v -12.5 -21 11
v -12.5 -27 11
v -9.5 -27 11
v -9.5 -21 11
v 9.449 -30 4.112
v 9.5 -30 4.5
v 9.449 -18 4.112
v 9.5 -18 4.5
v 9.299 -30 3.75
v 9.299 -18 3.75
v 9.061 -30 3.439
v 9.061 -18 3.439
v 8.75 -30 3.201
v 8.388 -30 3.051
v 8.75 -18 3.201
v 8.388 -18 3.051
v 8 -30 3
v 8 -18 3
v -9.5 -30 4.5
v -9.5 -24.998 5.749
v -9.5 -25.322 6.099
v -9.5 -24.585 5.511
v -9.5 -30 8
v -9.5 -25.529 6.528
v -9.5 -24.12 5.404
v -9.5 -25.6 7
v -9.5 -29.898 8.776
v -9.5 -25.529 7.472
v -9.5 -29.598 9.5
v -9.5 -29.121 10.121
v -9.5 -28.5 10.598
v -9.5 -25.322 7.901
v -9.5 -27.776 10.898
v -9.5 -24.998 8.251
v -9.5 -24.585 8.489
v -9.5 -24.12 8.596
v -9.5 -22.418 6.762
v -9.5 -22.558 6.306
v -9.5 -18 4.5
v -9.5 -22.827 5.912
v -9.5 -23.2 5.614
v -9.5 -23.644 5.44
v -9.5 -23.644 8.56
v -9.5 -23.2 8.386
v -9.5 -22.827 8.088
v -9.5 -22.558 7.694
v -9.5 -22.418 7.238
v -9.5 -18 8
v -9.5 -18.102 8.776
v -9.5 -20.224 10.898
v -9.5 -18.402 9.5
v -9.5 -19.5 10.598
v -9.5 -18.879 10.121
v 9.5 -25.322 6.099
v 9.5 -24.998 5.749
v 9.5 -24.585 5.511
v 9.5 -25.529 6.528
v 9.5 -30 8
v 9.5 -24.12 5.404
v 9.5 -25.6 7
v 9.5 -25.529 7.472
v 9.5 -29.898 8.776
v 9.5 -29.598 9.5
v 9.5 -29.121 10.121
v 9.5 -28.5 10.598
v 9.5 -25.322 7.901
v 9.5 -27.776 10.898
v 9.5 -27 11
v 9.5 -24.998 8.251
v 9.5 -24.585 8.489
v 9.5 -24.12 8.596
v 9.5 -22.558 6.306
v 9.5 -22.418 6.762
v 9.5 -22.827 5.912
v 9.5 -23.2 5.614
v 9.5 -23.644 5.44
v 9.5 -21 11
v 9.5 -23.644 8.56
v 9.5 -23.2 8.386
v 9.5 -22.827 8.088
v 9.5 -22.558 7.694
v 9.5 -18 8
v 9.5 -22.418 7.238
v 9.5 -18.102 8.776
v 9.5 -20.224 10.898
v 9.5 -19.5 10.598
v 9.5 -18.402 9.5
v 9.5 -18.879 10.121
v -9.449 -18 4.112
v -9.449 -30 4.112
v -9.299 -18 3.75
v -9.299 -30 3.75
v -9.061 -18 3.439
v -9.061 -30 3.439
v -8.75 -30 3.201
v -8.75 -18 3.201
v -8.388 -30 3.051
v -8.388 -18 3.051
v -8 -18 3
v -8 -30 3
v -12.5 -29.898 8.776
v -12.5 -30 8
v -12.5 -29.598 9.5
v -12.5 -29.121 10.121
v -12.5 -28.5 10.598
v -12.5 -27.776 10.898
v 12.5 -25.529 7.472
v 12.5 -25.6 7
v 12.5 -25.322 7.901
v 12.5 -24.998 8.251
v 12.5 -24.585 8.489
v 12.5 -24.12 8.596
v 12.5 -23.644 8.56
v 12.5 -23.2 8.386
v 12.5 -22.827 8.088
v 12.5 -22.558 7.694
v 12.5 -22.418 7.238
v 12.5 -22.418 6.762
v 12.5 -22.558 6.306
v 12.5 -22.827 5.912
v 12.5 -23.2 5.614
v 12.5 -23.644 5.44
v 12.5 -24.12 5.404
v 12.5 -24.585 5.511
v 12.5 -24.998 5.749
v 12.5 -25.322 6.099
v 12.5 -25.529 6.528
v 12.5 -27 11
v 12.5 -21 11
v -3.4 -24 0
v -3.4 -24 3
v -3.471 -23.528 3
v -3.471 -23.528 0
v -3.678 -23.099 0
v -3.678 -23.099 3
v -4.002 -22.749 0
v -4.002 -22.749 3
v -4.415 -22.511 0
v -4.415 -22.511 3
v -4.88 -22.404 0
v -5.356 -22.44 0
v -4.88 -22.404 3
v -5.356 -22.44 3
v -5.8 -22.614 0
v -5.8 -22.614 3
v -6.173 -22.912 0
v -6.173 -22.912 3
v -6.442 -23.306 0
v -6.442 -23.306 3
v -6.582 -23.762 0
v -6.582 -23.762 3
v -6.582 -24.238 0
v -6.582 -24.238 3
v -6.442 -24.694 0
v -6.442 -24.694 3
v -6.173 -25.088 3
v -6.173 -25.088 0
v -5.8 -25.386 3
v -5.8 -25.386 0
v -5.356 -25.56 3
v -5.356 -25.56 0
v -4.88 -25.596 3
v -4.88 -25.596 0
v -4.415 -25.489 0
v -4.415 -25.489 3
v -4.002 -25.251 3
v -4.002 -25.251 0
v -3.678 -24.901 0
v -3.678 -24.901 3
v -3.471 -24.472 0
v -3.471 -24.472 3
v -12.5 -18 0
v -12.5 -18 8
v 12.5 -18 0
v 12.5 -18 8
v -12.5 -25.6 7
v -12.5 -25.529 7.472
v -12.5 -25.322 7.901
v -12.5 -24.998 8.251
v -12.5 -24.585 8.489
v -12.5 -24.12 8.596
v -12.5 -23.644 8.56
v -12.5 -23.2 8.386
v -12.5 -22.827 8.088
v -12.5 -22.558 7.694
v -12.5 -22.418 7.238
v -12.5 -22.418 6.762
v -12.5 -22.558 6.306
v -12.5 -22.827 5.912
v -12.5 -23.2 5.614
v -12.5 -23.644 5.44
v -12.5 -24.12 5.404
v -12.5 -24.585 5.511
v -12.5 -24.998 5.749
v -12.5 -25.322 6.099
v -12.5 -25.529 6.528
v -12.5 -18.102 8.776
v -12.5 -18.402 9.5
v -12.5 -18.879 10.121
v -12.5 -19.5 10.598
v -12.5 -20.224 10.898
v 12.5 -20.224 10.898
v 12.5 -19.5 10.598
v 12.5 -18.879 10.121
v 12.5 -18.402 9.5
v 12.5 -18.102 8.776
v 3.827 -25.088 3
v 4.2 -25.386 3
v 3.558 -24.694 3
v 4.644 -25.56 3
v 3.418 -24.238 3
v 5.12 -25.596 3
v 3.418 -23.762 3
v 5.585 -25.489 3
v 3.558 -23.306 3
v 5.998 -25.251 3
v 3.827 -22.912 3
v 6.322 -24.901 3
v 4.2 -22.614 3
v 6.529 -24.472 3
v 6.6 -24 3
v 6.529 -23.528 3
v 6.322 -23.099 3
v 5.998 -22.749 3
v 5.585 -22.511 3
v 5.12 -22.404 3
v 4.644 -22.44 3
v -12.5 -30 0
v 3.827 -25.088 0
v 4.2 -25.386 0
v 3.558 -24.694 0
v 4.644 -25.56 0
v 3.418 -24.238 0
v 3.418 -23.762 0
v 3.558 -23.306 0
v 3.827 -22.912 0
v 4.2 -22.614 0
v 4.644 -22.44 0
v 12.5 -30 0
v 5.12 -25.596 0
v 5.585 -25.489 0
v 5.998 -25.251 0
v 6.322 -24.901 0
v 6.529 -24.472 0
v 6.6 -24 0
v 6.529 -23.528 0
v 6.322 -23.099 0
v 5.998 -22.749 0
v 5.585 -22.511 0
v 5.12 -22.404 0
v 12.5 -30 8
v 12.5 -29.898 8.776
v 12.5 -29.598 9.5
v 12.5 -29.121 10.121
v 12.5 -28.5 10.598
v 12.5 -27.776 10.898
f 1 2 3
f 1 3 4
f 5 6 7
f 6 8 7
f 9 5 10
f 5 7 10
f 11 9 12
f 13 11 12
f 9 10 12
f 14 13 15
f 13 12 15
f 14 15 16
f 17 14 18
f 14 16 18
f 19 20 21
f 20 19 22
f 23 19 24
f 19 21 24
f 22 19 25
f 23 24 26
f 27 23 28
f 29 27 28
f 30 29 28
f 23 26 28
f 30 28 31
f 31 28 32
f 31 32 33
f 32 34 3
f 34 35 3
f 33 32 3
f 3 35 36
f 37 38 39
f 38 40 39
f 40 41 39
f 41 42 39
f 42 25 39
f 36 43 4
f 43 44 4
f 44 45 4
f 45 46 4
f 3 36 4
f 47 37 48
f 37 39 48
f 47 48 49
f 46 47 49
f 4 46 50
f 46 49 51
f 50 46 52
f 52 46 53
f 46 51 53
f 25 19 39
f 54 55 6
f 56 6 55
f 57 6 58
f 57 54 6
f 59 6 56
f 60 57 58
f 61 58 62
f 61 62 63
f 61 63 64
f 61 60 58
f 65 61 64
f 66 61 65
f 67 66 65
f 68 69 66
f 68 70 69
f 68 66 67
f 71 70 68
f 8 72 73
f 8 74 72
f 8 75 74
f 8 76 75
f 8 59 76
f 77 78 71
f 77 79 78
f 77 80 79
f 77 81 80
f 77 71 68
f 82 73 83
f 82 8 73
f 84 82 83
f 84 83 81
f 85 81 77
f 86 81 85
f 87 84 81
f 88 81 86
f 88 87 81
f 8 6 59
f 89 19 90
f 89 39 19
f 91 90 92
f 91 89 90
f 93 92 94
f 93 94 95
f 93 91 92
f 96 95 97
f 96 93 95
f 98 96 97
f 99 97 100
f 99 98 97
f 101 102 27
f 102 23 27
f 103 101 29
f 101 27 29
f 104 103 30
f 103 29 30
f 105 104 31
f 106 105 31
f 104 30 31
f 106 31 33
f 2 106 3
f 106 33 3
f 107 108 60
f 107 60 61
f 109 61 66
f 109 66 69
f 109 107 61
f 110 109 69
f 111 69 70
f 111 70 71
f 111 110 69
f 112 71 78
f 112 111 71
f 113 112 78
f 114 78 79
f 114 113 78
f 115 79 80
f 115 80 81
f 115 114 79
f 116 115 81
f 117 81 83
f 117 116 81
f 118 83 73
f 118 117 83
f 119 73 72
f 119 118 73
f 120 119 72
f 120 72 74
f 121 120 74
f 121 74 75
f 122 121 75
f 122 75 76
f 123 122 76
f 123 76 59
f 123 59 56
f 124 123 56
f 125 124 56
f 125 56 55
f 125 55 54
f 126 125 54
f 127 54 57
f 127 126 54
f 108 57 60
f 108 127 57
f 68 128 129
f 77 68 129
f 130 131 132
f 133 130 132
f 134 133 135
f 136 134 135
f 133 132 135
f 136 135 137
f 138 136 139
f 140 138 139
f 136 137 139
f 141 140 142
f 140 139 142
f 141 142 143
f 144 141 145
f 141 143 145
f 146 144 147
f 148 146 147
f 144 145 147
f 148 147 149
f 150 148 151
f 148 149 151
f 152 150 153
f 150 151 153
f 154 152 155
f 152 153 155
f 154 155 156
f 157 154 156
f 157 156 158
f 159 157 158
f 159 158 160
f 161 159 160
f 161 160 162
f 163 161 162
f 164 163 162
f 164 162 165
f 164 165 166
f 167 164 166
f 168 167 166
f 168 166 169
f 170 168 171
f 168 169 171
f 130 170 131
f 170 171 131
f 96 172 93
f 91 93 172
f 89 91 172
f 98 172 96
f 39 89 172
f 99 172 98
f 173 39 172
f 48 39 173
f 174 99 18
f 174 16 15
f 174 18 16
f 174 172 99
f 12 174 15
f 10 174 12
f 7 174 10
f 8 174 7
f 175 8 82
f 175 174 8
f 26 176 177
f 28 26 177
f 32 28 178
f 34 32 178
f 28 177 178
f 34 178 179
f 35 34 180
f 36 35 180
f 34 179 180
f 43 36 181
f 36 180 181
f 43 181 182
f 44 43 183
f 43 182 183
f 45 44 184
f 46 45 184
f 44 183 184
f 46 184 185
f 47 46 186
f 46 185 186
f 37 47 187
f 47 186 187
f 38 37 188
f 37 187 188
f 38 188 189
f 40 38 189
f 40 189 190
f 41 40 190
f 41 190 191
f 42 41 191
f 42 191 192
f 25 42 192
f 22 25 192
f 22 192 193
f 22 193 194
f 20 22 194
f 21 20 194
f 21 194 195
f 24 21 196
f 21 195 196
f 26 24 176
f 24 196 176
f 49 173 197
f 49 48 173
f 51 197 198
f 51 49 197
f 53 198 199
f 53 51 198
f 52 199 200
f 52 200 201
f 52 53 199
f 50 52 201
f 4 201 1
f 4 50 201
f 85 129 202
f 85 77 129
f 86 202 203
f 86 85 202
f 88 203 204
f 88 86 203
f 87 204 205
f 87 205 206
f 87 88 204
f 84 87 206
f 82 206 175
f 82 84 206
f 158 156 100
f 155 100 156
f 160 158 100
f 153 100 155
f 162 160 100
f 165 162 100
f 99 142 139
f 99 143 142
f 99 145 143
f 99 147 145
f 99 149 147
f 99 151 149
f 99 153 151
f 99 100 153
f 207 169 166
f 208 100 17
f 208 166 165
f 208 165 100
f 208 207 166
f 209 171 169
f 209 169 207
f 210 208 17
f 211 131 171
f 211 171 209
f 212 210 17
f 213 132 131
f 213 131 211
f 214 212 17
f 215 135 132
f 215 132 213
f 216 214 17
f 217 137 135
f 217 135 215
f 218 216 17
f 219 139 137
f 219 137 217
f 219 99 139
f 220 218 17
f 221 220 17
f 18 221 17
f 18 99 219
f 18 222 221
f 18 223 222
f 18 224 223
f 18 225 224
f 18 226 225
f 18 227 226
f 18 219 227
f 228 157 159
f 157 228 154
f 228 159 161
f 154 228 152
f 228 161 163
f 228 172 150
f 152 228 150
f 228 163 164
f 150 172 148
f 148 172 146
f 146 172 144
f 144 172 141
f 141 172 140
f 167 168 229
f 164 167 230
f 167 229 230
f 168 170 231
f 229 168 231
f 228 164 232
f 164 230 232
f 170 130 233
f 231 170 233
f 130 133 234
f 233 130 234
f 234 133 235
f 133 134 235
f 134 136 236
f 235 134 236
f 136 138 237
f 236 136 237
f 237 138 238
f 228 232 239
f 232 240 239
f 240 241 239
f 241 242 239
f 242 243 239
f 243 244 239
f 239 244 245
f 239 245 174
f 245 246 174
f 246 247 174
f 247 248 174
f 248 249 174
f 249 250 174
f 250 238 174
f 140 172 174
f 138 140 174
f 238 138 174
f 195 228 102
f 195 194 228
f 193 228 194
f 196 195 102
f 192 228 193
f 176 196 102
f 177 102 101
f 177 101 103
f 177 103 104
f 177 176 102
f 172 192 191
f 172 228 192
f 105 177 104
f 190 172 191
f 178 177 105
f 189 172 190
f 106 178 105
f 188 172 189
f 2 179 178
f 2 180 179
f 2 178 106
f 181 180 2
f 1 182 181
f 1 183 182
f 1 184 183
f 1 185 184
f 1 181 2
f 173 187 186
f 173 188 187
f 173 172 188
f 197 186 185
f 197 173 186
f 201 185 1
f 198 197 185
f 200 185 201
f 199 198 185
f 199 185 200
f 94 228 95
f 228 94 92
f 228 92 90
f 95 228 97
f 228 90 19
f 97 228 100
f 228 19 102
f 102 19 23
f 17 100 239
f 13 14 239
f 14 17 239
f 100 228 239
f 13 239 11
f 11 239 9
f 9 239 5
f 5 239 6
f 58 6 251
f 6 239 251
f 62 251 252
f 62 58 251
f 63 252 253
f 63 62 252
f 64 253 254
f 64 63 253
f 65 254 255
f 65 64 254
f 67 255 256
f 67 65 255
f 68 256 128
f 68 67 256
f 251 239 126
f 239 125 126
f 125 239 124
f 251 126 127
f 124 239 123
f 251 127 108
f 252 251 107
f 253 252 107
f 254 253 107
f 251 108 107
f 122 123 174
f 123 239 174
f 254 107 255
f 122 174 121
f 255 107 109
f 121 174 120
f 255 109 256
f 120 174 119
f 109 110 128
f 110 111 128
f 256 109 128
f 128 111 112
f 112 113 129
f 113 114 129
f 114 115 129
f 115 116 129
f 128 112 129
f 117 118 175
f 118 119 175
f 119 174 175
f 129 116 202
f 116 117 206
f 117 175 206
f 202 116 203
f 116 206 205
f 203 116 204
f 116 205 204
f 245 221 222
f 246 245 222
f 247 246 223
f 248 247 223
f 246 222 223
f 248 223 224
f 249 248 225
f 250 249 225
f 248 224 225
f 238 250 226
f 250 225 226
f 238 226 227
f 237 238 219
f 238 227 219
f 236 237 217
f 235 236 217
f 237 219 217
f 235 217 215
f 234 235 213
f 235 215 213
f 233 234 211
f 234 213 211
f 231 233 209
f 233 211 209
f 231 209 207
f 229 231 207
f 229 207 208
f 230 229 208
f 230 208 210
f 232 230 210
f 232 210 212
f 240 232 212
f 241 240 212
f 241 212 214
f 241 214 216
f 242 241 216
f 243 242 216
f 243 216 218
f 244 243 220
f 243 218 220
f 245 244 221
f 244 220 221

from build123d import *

# Parameters (mm, degrees)
SKETCH_1_W             = 25
SKETCH_1_H             = 12
EXTRUDE_1_DEPTH        = 3
SKETCH_2_W             = 8
SKETCH_2_H             = 12
EXTRUDE_2_DEPTH        = 3
FILLET_1_R             = 3
FILLET_2_R             = 1.5
SKETCH_3_R             = 1.6
CUT_EXTRUDE_1_DEPTH    = 3
FILLET_1_OF_MIRROR_1_R = 3
FILLET_2_OF_MIRROR_1_R = 1.5
SKETCH_4_R             = 1.6
CUT_EXTRUDE_2_DEPTH    = 3


with BuildPart() as part:
    # 草图1 → 凸台-拉伸1 (new body)
    with BuildSketch(Plane.XY):
        with Locations((0, -24)):
            Rectangle(SKETCH_1_W, SKETCH_1_H)
    extrude(amount=EXTRUDE_1_DEPTH)

    # 草图2 → 凸台-拉伸2 (add)
    with BuildSketch(Plane.ZY.offset(12.5)):
        with Locations((7, -24)):
            Rectangle(SKETCH_2_W, SKETCH_2_H)
    extrude_2 = extrude(amount=-EXTRUDE_2_DEPTH)

    # 圆角1
    fillet_1_edges = [part.edges().sort_by_distance(p)[0] for p in [
        (-11, -18, 11),
        (-11, -30, 11),
    ]]
    fillet(fillet_1_edges, radius=FILLET_1_R)

    # 圆角2
    fillet_2_edges = [part.edges().sort_by_distance(p)[0] for p in [
        (-9.5, -24, 3),
    ]]
    fillet(fillet_2_edges, radius=FILLET_2_R)

    # 草图3 → 切除-拉伸1 (cut)
    with BuildSketch(Plane.ZY.offset(12.5)):
        with Locations(Location((7, -24, 0), (0, 0, 270))):
            Circle(SKETCH_3_R)
    cut_extrude_1 = extrude(amount=-CUT_EXTRUDE_1_DEPTH, mode=Mode.SUBTRACT)

    # 镜向1: 凸台-拉伸2, 切除-拉伸1 across plane
    add(extrude_2.mirror(Plane(origin=(0, 0, 0), x_dir=(0, 0, 1), z_dir=(1, 0, 0))))
    add(cut_extrude_1.mirror(Plane(origin=(0, 0, 0), x_dir=(0, 0, 1), z_dir=(1, 0, 0))), mode=Mode.SUBTRACT)

    # 圆角1 of 镜向1
    fillet_1_of_mirror_1_edges = [part.edges().sort_by_distance(p)[0] for p in [
        (11, -18, 11),
        (11, -30, 11),
    ]]
    fillet(fillet_1_of_mirror_1_edges, radius=FILLET_1_OF_MIRROR_1_R)

    # 圆角2 of 镜向1
    fillet_2_of_mirror_1_edges = [part.edges().sort_by_distance(p)[0] for p in [
        (9.5, -24, 3),
    ]]
    fillet(fillet_2_of_mirror_1_edges, radius=FILLET_2_OF_MIRROR_1_R)

    # 草图4 → 切除-拉伸2 (cut)
    with BuildSketch(Plane.XY.offset(3)):
        with Locations((5, -24)):
            Circle(SKETCH_4_R)
        with Locations((-5, -24)):
            Circle(SKETCH_4_R)
    extrude(amount=-CUT_EXTRUDE_2_DEPTH, mode=Mode.SUBTRACT)


solid = part.part
